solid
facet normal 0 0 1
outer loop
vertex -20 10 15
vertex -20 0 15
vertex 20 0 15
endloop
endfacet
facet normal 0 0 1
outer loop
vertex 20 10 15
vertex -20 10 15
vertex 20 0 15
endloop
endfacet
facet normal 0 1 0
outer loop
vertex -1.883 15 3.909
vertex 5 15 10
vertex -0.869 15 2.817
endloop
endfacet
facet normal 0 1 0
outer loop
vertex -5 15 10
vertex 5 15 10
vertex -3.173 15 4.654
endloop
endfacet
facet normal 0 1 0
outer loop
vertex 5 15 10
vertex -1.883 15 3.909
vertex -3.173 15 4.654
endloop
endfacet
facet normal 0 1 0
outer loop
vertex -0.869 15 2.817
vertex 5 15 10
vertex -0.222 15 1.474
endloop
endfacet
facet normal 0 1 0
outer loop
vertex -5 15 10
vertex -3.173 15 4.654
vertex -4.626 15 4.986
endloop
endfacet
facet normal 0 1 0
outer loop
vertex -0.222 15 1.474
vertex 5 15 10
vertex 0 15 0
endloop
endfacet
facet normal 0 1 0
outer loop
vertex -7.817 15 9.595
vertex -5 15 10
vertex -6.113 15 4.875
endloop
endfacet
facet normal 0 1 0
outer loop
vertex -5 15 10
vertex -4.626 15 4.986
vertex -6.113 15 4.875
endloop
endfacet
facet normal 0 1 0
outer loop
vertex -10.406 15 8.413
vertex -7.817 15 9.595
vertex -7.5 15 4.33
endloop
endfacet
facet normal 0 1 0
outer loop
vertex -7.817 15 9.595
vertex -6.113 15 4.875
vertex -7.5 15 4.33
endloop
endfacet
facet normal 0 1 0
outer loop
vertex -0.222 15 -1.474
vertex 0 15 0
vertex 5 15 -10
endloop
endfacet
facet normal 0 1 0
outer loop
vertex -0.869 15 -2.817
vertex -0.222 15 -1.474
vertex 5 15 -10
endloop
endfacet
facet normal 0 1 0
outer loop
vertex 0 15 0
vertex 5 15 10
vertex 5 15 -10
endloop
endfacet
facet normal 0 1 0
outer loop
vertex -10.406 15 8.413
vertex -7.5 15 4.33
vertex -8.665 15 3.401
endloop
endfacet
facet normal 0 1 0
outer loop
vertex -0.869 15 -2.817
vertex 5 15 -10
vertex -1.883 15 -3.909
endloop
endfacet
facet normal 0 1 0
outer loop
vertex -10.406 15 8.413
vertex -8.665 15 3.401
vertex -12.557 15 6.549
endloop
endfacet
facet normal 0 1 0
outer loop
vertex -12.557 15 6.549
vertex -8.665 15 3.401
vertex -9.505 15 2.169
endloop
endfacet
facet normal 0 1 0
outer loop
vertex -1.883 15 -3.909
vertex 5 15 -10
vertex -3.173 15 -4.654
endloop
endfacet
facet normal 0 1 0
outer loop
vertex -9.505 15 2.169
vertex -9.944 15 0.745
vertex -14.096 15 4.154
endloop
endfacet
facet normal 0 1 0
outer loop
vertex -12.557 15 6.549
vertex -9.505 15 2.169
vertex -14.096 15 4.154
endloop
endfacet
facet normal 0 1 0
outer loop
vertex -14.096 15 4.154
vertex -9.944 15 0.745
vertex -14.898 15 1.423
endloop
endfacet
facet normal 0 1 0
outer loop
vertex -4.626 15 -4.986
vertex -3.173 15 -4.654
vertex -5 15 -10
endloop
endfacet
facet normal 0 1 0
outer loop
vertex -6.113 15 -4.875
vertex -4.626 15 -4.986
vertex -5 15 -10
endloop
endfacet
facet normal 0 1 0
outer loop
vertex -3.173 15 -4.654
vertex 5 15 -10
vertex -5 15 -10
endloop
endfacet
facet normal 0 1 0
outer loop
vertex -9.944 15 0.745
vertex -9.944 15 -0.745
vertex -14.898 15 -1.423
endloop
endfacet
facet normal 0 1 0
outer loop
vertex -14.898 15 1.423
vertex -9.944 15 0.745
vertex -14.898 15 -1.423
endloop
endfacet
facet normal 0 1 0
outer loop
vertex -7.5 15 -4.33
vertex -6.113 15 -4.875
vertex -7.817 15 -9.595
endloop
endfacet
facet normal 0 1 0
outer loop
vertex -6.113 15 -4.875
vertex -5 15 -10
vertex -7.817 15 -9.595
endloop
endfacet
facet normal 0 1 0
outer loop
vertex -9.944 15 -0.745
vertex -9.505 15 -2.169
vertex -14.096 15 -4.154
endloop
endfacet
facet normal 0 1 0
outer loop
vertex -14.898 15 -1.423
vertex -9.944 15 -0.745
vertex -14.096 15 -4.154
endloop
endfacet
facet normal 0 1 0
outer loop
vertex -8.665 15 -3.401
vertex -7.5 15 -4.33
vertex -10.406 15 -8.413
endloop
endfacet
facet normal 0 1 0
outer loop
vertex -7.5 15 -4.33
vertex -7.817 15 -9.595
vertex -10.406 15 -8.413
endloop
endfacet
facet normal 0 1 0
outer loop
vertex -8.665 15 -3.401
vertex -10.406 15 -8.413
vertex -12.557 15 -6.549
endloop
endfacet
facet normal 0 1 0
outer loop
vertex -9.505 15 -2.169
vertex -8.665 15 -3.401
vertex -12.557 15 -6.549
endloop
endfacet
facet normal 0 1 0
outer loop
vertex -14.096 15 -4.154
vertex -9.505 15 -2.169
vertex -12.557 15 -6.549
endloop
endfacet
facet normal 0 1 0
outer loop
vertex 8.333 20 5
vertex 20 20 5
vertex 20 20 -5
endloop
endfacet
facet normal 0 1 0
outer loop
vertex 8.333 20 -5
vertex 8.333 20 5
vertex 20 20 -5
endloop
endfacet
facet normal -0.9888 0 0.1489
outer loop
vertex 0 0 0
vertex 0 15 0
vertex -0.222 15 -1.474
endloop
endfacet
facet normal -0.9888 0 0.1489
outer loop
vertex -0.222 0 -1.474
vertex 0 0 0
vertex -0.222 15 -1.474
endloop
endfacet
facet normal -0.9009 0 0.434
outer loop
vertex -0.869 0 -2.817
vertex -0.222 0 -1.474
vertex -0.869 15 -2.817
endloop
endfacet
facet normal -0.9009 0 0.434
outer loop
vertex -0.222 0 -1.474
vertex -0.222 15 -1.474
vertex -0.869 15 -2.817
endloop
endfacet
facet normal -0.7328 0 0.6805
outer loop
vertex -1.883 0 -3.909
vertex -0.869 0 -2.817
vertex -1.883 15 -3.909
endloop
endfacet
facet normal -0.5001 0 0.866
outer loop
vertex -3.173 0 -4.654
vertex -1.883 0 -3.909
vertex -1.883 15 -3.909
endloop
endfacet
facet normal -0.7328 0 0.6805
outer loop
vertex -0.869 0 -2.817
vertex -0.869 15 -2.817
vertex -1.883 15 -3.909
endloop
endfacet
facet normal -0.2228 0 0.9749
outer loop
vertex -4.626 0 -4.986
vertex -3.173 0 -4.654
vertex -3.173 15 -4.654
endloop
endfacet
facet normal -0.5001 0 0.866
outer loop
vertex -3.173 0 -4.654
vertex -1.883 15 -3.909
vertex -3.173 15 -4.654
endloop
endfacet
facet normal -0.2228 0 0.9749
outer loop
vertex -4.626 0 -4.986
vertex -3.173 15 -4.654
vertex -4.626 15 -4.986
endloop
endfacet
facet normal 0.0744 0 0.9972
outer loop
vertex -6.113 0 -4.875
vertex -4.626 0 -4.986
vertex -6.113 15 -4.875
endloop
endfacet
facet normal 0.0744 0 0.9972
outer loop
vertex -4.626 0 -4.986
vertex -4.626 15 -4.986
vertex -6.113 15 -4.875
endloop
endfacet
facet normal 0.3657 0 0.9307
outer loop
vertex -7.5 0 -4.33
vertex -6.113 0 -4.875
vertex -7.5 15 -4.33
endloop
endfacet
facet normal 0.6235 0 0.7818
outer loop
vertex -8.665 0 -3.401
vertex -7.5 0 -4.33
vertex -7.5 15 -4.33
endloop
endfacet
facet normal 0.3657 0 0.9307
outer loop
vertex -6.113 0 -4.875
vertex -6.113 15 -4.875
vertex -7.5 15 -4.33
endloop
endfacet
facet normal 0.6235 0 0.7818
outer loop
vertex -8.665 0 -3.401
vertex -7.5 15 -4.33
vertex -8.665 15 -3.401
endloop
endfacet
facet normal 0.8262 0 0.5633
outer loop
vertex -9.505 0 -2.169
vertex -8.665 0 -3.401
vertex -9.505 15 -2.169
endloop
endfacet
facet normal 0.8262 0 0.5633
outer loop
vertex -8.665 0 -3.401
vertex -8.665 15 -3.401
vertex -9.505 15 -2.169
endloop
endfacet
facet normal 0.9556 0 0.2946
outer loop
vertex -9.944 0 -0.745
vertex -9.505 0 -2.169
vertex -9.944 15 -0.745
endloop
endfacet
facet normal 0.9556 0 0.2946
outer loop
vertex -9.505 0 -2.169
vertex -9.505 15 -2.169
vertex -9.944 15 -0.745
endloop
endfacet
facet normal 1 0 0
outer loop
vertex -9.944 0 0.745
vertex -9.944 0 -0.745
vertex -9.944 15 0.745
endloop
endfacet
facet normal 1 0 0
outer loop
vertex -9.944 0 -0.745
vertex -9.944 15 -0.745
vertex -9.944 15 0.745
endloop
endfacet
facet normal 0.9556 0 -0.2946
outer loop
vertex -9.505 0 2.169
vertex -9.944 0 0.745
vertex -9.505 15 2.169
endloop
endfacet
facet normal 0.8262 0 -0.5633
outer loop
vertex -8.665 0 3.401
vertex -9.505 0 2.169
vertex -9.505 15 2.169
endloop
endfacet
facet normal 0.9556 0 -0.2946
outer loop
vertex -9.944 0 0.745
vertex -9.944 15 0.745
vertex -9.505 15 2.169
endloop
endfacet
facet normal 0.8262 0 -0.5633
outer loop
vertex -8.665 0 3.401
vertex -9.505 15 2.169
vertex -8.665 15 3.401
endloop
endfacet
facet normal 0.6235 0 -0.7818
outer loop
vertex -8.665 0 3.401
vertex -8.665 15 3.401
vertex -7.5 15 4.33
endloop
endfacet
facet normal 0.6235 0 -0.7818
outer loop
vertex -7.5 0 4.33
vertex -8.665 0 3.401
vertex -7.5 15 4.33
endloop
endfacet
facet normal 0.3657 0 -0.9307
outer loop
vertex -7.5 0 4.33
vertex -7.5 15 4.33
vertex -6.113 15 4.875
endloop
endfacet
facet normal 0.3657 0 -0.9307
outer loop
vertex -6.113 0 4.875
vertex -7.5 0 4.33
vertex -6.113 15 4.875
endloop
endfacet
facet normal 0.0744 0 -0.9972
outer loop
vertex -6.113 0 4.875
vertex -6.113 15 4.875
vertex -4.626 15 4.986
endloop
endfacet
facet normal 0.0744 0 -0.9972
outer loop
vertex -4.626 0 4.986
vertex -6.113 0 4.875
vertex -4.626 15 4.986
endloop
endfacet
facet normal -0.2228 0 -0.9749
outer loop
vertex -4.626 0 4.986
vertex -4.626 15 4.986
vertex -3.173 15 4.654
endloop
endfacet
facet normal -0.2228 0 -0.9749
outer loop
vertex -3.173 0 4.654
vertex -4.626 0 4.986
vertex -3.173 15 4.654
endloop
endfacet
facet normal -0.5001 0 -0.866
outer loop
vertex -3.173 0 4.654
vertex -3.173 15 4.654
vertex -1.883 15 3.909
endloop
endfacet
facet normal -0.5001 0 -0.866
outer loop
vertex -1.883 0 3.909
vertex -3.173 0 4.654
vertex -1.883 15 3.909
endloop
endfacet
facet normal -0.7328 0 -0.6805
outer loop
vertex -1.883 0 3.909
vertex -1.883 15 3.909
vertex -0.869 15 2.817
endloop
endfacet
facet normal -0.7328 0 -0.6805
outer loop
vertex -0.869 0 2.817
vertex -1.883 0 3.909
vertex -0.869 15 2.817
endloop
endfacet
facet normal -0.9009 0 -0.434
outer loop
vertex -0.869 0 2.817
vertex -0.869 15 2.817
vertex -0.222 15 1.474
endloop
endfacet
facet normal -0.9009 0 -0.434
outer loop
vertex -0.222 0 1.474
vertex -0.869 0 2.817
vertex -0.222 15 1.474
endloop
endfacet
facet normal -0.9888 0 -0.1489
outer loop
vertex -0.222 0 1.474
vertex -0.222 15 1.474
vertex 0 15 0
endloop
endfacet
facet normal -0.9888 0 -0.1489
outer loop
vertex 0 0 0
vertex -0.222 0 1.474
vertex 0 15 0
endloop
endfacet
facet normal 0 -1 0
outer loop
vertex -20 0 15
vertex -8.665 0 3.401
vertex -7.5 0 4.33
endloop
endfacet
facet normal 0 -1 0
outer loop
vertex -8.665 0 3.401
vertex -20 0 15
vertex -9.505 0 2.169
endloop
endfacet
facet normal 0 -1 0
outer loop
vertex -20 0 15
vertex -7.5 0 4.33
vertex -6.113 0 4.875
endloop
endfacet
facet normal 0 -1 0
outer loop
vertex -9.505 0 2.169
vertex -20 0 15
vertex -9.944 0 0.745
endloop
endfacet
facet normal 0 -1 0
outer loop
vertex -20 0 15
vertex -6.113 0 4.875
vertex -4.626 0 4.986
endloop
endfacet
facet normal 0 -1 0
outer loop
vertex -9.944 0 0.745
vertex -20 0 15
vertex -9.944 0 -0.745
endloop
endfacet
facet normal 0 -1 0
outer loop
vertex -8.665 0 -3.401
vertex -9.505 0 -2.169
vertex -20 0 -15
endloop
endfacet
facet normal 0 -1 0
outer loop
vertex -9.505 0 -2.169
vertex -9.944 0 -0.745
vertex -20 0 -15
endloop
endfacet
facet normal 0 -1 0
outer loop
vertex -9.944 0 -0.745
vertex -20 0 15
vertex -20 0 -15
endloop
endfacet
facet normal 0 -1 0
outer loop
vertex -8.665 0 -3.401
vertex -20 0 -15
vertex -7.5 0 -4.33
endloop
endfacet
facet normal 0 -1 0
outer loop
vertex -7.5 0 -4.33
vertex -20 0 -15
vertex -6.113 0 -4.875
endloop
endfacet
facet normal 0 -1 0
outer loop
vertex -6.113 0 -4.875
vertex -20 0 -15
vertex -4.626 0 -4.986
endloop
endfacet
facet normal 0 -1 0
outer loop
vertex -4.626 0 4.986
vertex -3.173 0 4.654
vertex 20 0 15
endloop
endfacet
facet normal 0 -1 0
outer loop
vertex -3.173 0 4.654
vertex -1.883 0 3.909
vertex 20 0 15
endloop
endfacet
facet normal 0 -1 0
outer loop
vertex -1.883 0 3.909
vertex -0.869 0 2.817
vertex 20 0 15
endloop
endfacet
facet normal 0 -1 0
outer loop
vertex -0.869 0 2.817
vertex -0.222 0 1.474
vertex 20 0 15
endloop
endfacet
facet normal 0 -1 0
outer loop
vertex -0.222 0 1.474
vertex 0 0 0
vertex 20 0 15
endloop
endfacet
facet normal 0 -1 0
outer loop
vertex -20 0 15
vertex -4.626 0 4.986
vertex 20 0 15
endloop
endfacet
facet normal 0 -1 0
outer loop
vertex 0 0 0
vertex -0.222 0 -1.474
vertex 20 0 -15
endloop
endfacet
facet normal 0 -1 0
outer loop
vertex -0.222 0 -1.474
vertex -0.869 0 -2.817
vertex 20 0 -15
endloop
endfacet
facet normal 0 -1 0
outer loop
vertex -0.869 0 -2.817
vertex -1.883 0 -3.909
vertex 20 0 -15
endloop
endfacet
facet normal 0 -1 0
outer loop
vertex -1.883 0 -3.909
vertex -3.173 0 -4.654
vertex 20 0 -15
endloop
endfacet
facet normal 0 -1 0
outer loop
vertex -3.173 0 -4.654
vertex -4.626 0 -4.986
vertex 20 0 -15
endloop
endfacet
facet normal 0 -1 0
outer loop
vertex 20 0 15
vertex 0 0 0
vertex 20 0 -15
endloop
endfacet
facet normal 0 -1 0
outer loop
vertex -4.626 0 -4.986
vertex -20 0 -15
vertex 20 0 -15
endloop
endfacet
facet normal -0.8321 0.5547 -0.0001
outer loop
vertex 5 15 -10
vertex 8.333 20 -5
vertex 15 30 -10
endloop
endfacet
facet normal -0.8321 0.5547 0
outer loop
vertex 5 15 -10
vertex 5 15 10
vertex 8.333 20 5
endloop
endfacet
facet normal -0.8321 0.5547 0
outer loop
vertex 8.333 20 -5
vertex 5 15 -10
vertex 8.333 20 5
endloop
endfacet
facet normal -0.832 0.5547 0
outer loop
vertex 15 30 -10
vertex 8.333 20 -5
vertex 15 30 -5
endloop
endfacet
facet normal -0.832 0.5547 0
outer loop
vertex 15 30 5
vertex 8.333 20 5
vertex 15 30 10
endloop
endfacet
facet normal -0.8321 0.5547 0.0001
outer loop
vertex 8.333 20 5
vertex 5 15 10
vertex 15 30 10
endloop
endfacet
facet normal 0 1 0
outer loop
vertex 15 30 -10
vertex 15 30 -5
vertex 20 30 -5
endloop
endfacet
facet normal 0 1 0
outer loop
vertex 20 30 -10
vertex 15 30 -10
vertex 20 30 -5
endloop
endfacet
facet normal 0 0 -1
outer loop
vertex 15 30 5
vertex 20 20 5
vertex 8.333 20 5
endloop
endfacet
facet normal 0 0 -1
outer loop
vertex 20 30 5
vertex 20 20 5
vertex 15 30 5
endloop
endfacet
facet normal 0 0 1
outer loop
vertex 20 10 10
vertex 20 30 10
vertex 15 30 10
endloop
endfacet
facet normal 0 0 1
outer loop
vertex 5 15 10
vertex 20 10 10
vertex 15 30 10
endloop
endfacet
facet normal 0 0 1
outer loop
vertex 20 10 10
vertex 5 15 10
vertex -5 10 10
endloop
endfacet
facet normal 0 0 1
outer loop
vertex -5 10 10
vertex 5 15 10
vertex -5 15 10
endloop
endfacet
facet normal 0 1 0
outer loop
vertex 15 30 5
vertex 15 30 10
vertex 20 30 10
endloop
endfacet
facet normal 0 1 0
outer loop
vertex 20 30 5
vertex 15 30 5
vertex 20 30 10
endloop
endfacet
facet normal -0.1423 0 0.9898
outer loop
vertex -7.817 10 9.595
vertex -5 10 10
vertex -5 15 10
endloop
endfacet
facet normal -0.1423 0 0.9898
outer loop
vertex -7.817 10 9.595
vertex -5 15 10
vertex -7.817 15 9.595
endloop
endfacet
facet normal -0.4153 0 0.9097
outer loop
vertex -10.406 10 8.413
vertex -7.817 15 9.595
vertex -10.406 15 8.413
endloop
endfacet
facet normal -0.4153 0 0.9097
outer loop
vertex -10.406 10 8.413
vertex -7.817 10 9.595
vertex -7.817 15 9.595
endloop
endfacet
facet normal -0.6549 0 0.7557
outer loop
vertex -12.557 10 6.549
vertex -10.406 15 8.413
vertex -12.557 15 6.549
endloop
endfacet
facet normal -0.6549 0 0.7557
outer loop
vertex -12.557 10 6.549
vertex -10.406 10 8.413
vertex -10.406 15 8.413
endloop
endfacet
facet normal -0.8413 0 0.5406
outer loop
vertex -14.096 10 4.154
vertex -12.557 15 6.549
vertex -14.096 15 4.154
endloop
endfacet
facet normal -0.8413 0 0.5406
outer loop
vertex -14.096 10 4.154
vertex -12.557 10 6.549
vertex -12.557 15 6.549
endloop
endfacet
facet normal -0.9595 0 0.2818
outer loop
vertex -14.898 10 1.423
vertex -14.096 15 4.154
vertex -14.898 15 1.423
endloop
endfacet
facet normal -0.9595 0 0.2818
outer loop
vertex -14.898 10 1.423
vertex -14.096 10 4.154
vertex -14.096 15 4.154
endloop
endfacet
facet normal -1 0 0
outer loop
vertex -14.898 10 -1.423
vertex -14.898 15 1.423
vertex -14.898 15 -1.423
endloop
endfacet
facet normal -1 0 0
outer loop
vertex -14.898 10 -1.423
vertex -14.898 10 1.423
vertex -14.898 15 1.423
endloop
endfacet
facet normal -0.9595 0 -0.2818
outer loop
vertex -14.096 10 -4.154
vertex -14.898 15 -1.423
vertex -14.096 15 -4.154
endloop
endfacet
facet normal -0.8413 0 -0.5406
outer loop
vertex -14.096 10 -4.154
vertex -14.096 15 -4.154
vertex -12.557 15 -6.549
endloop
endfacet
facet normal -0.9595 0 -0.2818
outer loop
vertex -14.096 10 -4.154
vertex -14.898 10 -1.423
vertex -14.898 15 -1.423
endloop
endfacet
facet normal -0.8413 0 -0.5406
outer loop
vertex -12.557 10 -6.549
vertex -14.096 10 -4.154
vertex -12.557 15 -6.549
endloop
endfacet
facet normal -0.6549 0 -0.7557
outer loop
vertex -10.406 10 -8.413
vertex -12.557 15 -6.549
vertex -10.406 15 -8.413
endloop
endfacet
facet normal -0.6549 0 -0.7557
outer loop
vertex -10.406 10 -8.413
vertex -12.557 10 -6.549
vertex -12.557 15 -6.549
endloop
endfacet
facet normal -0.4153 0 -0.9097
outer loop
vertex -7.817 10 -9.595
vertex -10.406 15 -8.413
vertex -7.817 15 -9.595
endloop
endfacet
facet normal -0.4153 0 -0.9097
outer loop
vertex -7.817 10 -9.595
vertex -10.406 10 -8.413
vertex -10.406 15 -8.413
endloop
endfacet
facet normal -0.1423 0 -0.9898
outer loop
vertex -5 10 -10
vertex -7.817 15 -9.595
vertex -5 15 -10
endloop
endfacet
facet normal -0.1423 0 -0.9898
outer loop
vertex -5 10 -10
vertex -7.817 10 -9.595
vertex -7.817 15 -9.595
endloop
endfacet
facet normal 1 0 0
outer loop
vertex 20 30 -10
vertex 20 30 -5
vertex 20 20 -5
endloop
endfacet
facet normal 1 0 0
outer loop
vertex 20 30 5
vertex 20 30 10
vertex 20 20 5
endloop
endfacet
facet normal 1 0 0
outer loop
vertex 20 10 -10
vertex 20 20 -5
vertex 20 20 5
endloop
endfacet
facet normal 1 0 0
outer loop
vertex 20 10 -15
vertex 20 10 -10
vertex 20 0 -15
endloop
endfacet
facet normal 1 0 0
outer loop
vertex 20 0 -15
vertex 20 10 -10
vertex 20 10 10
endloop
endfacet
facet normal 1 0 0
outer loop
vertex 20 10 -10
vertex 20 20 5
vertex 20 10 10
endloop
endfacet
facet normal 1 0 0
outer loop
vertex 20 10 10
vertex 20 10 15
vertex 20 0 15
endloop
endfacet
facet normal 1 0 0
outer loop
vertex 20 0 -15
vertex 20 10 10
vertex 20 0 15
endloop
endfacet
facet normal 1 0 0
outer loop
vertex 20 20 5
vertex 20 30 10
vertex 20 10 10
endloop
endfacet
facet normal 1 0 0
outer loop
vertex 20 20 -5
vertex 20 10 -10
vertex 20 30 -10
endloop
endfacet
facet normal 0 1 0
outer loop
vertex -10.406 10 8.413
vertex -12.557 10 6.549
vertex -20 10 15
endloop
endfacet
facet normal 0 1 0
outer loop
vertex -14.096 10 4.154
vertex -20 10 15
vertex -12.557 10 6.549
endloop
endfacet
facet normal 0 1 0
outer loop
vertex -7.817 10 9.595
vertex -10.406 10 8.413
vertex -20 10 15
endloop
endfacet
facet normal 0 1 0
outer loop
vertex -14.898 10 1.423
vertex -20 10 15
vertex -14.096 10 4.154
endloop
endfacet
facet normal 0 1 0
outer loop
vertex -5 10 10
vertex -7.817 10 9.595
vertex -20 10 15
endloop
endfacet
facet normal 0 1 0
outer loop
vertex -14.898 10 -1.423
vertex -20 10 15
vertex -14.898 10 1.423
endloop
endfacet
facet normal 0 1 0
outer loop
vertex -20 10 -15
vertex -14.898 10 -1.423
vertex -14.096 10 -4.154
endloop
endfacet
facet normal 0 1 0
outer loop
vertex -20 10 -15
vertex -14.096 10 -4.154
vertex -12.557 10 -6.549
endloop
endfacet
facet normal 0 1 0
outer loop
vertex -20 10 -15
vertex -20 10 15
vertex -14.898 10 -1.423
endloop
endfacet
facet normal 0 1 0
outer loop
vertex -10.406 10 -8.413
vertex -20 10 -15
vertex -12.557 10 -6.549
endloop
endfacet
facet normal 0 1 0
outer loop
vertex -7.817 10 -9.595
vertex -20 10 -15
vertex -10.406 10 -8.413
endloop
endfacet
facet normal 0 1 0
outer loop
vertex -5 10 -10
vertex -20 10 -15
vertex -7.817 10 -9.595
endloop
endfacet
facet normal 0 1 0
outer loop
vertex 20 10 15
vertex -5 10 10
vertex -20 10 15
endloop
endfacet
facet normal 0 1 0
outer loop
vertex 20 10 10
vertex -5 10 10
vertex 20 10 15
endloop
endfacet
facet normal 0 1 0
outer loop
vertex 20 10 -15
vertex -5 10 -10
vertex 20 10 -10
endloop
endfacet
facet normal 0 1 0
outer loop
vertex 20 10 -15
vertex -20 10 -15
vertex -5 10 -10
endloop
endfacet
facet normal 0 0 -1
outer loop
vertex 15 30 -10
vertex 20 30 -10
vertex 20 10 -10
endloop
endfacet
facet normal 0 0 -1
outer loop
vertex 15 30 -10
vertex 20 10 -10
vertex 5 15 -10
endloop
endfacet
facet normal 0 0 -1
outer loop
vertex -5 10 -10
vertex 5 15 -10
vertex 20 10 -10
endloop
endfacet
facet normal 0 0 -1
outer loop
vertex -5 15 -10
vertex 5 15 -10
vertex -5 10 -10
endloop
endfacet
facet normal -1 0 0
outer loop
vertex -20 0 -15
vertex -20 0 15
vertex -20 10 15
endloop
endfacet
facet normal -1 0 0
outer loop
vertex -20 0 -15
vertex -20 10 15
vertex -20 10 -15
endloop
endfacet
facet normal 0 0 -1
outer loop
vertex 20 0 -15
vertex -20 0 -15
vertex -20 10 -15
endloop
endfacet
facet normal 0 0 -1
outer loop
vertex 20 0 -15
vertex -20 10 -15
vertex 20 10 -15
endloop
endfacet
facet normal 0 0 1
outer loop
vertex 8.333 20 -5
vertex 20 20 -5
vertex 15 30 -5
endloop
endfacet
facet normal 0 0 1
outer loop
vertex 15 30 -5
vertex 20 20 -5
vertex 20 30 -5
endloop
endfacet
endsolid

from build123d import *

# Parameters (mm, degrees)
ESBO_O1_W                = 40
ESBO_O1_H                = 30
RESSALTO_EXTRUS_O1_DEPTH = 10
RESSALTO_EXTRUS_O2_DEPTH = 5
RESSALTO_EXTRUS_O3_DEPTH = 20
ESBO_O4_W                = 10
ESBO_O4_H                = 10
CORTE_EXTRUS_O1_DEPTH    = 41
ESBO_O5_R                = 5
CORTE_EXTRUS_O2_DEPTH    = 16


with BuildPart() as part:
    # Esboço1 → Ressalto-extrusão1 (new body)
    with BuildSketch(Plane(origin=(0, 0, 0), x_dir=(1, 0, 0), z_dir=(0, 1, 0))):
        Rectangle(ESBO_O1_W, ESBO_O1_H)
    extrude(amount=RESSALTO_EXTRUS_O1_DEPTH)

    # Esboço2 → Ressalto-extrusão2 (add)
    with BuildSketch(Plane(origin=(0, 10, 0), x_dir=(1, 0, 0), z_dir=(0, 1, 0))):
        with BuildLine():
            Line((20, 10), (20, -10))
            Line((20, -10), (-5, -10))
            ThreePointArc((-5, -10), (-15, 0), (-5, 10))
            Line((-5, 10), (20, 10))
        make_face()
    extrude(amount=RESSALTO_EXTRUS_O2_DEPTH)

    # Esboço3 → Ressalto-extrusão3 (add)
    with BuildSketch(Plane.XY.offset(10)):
        Polygon((20, 15), (5, 15), (15, 30), (20, 30), align=None)
    extrude(amount=-RESSALTO_EXTRUS_O3_DEPTH)

    # Esboço4 → Corte-extrusão1 (cut, through all)
    with BuildSketch(Plane(origin=(20, 0, 0), x_dir=(0, 0, -1), z_dir=(1, 0, 0))):
        with Locations((0, 25)):
            Rectangle(ESBO_O4_W, ESBO_O4_H)
    extrude(amount=-CORTE_EXTRUS_O1_DEPTH, mode=Mode.SUBTRACT)

    # Esboço5 → Corte-extrusão2 (cut, through all)
    with BuildSketch(Plane(origin=(0, 15, 0), x_dir=(1, 0, 0), z_dir=(0, 1, 0))):
        with Locations((-5, 0)):
            Circle(ESBO_O5_R)
    extrude(amount=-CORTE_EXTRUS_O2_DEPTH, mode=Mode.SUBTRACT)


solid = part.part
